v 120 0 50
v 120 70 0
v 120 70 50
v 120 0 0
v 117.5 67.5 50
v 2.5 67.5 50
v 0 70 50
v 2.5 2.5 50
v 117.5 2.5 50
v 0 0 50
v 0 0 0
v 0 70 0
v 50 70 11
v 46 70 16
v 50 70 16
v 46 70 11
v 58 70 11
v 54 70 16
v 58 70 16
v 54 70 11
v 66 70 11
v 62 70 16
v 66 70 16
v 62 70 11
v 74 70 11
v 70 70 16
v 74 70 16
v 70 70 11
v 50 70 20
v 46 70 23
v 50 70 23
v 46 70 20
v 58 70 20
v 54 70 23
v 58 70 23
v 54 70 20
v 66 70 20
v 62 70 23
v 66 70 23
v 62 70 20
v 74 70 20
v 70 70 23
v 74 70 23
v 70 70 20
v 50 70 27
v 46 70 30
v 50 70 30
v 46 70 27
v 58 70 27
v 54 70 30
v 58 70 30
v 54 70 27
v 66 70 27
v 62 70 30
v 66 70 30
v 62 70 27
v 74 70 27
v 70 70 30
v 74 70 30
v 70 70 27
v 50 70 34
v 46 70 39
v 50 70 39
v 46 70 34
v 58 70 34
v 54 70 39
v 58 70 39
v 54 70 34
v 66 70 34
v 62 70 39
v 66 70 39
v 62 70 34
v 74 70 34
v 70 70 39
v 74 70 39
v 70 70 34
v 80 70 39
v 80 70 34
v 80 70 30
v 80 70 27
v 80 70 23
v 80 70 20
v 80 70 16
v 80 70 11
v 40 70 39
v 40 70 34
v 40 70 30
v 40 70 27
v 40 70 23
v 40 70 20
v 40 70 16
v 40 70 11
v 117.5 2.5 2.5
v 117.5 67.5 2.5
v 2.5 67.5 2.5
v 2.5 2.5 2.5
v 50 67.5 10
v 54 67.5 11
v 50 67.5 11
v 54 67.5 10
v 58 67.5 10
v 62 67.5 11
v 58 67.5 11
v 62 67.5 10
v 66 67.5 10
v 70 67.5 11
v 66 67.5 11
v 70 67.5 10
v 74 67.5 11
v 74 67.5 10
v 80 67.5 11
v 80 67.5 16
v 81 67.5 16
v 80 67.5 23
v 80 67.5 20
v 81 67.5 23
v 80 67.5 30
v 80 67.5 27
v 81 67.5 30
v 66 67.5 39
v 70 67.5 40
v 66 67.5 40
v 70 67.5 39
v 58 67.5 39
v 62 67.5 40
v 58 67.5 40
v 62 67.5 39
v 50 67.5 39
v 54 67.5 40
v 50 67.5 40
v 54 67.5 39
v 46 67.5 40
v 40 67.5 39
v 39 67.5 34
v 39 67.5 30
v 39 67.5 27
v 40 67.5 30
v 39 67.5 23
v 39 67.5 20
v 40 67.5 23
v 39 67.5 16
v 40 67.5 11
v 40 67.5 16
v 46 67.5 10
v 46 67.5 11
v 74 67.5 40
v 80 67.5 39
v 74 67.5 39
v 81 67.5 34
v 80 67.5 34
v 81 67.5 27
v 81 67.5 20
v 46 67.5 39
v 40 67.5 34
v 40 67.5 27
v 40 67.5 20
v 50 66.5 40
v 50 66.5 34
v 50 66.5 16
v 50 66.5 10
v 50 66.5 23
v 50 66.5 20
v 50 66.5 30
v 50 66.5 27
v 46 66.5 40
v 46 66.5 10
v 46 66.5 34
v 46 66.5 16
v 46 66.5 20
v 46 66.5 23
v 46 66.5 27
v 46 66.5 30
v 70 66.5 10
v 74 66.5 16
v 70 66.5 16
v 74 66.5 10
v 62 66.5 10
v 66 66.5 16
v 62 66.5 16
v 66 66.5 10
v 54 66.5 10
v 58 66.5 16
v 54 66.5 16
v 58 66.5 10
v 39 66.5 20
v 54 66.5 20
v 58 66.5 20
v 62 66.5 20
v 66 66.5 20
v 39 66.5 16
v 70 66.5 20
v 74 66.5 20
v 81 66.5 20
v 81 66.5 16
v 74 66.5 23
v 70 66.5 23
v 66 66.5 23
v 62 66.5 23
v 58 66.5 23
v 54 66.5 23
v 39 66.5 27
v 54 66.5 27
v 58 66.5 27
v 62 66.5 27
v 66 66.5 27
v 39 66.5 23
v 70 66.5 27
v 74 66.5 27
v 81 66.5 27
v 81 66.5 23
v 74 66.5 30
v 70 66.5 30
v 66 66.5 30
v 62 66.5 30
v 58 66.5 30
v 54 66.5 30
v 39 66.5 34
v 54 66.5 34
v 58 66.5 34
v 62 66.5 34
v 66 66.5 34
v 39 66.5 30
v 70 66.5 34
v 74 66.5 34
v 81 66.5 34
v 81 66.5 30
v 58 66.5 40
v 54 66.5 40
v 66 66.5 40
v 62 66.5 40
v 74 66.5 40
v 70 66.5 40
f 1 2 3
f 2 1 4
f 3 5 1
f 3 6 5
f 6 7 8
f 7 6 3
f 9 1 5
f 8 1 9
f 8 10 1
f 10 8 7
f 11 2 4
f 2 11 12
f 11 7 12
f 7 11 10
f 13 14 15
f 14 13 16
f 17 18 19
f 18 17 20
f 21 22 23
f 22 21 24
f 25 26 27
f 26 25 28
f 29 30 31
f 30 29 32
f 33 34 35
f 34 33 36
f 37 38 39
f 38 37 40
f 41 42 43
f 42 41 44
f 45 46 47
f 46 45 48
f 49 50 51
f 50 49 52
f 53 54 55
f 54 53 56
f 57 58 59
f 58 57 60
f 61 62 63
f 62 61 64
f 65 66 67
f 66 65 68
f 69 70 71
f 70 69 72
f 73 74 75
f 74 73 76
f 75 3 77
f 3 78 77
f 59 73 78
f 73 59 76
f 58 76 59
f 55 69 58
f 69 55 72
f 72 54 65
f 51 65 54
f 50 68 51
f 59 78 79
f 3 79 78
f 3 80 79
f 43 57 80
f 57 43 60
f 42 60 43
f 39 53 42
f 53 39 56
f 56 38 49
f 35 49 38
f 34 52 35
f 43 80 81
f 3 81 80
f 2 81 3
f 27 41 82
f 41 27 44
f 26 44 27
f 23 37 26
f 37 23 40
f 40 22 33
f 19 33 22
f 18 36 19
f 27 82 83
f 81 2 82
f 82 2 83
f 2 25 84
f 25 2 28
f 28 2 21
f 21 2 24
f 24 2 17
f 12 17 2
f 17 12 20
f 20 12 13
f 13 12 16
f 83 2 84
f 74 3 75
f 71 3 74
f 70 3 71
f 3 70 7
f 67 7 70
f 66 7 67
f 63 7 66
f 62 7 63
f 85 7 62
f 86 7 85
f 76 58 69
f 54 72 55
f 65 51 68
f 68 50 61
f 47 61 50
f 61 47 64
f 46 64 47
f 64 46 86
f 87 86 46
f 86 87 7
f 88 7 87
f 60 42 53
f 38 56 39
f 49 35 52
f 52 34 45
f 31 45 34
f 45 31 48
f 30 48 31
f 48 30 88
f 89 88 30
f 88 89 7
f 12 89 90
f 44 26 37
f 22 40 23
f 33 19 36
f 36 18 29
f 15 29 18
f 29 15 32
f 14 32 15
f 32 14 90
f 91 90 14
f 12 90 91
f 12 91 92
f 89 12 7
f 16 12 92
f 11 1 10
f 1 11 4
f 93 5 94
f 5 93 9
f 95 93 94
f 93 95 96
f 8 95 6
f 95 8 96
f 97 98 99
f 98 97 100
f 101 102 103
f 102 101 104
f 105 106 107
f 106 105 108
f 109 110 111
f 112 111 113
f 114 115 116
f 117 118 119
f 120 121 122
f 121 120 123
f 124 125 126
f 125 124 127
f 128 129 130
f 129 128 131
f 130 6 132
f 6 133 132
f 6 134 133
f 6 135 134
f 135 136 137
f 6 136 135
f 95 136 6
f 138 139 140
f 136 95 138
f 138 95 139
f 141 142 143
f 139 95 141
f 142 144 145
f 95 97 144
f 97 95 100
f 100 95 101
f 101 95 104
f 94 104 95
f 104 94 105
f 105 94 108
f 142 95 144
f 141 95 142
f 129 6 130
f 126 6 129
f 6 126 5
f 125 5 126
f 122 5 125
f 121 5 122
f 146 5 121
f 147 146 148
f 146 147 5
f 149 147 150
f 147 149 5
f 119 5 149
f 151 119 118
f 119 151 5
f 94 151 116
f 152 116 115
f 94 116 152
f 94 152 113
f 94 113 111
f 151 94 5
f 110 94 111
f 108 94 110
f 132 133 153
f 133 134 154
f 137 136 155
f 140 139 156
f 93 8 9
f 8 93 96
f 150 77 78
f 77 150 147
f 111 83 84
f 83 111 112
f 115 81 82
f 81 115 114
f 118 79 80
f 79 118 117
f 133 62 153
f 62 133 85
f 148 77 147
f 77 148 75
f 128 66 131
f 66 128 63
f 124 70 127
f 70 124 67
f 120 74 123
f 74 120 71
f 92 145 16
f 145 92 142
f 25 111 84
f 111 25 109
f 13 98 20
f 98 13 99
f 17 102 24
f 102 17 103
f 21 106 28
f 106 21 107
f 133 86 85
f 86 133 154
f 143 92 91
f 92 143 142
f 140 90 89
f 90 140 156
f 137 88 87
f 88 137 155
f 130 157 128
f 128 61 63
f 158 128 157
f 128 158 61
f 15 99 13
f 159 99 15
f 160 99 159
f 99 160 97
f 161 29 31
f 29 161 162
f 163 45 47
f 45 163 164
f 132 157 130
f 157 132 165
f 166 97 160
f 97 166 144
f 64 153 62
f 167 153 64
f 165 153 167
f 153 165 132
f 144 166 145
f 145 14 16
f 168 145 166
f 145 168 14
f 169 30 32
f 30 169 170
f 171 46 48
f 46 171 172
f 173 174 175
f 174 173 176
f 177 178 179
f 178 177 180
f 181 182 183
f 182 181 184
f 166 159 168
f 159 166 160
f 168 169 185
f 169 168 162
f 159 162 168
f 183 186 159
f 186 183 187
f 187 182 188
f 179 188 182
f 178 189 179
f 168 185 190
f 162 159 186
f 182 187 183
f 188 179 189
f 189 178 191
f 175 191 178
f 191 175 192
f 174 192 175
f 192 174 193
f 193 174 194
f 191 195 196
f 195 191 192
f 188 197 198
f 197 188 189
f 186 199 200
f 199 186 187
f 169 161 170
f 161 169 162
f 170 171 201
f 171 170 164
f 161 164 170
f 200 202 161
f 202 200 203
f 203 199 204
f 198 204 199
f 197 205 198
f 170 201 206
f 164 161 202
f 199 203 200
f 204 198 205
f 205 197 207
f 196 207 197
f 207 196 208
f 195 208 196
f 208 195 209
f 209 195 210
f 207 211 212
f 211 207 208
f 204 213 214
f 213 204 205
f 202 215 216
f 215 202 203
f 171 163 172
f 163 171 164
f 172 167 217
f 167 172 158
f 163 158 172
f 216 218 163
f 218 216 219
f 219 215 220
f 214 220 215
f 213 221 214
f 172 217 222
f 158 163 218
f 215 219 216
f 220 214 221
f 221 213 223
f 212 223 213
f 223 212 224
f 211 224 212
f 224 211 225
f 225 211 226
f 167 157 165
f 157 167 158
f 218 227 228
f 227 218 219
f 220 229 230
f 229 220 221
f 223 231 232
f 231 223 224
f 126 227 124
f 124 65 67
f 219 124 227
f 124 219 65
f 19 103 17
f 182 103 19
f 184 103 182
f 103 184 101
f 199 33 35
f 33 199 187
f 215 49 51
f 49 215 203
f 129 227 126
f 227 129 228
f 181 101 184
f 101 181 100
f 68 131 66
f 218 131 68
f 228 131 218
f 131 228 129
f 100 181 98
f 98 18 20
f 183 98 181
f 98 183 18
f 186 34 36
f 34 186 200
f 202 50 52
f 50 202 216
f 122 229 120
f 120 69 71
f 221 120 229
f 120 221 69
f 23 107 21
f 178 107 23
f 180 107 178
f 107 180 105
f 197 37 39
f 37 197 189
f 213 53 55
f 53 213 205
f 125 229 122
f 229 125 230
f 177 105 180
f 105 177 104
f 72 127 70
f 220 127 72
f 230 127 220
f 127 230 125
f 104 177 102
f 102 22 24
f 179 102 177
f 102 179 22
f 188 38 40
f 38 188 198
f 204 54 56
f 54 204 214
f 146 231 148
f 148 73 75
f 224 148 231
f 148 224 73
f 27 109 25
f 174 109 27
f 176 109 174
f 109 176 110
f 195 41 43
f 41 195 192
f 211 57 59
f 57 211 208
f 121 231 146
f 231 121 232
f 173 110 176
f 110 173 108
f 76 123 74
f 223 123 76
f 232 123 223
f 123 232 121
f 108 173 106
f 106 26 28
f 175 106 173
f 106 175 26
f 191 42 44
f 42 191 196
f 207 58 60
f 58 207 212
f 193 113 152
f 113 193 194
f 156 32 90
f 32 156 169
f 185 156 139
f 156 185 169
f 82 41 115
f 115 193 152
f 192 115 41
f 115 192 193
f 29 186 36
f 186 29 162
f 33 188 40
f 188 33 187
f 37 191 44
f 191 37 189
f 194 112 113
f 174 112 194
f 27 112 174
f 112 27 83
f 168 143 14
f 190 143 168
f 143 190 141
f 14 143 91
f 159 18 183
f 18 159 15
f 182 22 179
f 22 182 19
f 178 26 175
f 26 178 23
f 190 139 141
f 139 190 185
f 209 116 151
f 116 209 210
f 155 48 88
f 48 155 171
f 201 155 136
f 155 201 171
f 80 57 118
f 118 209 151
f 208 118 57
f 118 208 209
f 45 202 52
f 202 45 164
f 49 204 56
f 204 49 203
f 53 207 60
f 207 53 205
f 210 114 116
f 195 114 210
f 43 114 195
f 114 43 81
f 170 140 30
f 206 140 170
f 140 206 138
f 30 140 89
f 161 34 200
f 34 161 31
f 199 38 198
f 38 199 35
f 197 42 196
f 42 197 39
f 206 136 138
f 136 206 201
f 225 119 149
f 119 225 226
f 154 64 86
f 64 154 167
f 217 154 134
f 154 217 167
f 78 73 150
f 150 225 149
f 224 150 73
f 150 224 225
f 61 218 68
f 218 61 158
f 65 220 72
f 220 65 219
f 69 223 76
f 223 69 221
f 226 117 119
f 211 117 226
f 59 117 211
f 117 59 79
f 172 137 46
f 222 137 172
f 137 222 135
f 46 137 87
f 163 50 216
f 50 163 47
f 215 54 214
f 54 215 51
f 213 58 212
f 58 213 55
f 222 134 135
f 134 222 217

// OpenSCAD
$fn = 32;

// ----------------------------------------------------------------------
// Vent box: crossgrid enclosure
// ----------------------------------------------------------------------

// --- parameters (mm) ---
box_l = 120;              // box length, X
box_w = 70;               // box width, Y
box_h = 50;               // box height, Z
wall_t = 2.5;             // shell wall thickness
win_l = 40;               // vent window width, X
win_h = 28;               // vent window height, Z
bar_w = 4;                // grid bar width
n_v = 4;                  // vertical bar count
n_h = 3;                  // horizontal bar count
fit_tol = 0.05;           // tolerance for press fits, mm
free_tol = 0.3;           // tolerance for clearance fits, mm

win_z0 = (box_h - win_h) / 2;  // window lower edge Z
v_step = win_l / (n_v + 1);  // vertical bar step
h_step = win_h / (n_h + 1);  // horizontal bar step

difference() {
  union() {
    difference() {
      cube([box_l, box_w, box_h]);
  translate([wall_t, wall_t, wall_t])
    cube([box_l - 2 * wall_t, box_w - 2 * wall_t, box_h]);
  translate([(box_l - win_l) / 2, box_w - wall_t - 1, win_z0])
    cube([win_l, wall_t + 2, win_h]);
    }
    for (i = [1 : n_v])
      translate([(box_l - win_l) / 2 + i * v_step - bar_w / 2,
                 box_w - wall_t - 1, win_z0 - 1])
        cube([bar_w, wall_t + 1, win_h + 2]);
    for (i = [1 : n_h])
      translate([(box_l - win_l) / 2 - 1, box_w - wall_t - 1,
                 win_z0 + i * h_step - bar_w / 2])
        cube([win_l + 2, wall_t + 1, bar_w]);
  }
}
